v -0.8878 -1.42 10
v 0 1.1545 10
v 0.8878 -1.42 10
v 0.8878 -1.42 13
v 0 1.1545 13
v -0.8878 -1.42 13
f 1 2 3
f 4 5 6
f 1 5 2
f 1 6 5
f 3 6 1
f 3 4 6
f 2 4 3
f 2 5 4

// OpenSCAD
$fn=180;
eps=0.01;

att_high=3.00;
fl_rad=0.3;

// Adhesion plate
//cylinder(1, 4, 4);

// Pointer
for (x=[3]) {
    translate([0, 0, x*att_high+1]) linear_extrude(att_high) offset(r=x*-0.03) hull() {
        translate([0, fl_rad+1.1, 0]) circle(eps);
        translate([1, fl_rad-1.8, 0]) circle(eps);
        translate([-1, fl_rad-1.8, 0]) circle(eps);
    }
}
